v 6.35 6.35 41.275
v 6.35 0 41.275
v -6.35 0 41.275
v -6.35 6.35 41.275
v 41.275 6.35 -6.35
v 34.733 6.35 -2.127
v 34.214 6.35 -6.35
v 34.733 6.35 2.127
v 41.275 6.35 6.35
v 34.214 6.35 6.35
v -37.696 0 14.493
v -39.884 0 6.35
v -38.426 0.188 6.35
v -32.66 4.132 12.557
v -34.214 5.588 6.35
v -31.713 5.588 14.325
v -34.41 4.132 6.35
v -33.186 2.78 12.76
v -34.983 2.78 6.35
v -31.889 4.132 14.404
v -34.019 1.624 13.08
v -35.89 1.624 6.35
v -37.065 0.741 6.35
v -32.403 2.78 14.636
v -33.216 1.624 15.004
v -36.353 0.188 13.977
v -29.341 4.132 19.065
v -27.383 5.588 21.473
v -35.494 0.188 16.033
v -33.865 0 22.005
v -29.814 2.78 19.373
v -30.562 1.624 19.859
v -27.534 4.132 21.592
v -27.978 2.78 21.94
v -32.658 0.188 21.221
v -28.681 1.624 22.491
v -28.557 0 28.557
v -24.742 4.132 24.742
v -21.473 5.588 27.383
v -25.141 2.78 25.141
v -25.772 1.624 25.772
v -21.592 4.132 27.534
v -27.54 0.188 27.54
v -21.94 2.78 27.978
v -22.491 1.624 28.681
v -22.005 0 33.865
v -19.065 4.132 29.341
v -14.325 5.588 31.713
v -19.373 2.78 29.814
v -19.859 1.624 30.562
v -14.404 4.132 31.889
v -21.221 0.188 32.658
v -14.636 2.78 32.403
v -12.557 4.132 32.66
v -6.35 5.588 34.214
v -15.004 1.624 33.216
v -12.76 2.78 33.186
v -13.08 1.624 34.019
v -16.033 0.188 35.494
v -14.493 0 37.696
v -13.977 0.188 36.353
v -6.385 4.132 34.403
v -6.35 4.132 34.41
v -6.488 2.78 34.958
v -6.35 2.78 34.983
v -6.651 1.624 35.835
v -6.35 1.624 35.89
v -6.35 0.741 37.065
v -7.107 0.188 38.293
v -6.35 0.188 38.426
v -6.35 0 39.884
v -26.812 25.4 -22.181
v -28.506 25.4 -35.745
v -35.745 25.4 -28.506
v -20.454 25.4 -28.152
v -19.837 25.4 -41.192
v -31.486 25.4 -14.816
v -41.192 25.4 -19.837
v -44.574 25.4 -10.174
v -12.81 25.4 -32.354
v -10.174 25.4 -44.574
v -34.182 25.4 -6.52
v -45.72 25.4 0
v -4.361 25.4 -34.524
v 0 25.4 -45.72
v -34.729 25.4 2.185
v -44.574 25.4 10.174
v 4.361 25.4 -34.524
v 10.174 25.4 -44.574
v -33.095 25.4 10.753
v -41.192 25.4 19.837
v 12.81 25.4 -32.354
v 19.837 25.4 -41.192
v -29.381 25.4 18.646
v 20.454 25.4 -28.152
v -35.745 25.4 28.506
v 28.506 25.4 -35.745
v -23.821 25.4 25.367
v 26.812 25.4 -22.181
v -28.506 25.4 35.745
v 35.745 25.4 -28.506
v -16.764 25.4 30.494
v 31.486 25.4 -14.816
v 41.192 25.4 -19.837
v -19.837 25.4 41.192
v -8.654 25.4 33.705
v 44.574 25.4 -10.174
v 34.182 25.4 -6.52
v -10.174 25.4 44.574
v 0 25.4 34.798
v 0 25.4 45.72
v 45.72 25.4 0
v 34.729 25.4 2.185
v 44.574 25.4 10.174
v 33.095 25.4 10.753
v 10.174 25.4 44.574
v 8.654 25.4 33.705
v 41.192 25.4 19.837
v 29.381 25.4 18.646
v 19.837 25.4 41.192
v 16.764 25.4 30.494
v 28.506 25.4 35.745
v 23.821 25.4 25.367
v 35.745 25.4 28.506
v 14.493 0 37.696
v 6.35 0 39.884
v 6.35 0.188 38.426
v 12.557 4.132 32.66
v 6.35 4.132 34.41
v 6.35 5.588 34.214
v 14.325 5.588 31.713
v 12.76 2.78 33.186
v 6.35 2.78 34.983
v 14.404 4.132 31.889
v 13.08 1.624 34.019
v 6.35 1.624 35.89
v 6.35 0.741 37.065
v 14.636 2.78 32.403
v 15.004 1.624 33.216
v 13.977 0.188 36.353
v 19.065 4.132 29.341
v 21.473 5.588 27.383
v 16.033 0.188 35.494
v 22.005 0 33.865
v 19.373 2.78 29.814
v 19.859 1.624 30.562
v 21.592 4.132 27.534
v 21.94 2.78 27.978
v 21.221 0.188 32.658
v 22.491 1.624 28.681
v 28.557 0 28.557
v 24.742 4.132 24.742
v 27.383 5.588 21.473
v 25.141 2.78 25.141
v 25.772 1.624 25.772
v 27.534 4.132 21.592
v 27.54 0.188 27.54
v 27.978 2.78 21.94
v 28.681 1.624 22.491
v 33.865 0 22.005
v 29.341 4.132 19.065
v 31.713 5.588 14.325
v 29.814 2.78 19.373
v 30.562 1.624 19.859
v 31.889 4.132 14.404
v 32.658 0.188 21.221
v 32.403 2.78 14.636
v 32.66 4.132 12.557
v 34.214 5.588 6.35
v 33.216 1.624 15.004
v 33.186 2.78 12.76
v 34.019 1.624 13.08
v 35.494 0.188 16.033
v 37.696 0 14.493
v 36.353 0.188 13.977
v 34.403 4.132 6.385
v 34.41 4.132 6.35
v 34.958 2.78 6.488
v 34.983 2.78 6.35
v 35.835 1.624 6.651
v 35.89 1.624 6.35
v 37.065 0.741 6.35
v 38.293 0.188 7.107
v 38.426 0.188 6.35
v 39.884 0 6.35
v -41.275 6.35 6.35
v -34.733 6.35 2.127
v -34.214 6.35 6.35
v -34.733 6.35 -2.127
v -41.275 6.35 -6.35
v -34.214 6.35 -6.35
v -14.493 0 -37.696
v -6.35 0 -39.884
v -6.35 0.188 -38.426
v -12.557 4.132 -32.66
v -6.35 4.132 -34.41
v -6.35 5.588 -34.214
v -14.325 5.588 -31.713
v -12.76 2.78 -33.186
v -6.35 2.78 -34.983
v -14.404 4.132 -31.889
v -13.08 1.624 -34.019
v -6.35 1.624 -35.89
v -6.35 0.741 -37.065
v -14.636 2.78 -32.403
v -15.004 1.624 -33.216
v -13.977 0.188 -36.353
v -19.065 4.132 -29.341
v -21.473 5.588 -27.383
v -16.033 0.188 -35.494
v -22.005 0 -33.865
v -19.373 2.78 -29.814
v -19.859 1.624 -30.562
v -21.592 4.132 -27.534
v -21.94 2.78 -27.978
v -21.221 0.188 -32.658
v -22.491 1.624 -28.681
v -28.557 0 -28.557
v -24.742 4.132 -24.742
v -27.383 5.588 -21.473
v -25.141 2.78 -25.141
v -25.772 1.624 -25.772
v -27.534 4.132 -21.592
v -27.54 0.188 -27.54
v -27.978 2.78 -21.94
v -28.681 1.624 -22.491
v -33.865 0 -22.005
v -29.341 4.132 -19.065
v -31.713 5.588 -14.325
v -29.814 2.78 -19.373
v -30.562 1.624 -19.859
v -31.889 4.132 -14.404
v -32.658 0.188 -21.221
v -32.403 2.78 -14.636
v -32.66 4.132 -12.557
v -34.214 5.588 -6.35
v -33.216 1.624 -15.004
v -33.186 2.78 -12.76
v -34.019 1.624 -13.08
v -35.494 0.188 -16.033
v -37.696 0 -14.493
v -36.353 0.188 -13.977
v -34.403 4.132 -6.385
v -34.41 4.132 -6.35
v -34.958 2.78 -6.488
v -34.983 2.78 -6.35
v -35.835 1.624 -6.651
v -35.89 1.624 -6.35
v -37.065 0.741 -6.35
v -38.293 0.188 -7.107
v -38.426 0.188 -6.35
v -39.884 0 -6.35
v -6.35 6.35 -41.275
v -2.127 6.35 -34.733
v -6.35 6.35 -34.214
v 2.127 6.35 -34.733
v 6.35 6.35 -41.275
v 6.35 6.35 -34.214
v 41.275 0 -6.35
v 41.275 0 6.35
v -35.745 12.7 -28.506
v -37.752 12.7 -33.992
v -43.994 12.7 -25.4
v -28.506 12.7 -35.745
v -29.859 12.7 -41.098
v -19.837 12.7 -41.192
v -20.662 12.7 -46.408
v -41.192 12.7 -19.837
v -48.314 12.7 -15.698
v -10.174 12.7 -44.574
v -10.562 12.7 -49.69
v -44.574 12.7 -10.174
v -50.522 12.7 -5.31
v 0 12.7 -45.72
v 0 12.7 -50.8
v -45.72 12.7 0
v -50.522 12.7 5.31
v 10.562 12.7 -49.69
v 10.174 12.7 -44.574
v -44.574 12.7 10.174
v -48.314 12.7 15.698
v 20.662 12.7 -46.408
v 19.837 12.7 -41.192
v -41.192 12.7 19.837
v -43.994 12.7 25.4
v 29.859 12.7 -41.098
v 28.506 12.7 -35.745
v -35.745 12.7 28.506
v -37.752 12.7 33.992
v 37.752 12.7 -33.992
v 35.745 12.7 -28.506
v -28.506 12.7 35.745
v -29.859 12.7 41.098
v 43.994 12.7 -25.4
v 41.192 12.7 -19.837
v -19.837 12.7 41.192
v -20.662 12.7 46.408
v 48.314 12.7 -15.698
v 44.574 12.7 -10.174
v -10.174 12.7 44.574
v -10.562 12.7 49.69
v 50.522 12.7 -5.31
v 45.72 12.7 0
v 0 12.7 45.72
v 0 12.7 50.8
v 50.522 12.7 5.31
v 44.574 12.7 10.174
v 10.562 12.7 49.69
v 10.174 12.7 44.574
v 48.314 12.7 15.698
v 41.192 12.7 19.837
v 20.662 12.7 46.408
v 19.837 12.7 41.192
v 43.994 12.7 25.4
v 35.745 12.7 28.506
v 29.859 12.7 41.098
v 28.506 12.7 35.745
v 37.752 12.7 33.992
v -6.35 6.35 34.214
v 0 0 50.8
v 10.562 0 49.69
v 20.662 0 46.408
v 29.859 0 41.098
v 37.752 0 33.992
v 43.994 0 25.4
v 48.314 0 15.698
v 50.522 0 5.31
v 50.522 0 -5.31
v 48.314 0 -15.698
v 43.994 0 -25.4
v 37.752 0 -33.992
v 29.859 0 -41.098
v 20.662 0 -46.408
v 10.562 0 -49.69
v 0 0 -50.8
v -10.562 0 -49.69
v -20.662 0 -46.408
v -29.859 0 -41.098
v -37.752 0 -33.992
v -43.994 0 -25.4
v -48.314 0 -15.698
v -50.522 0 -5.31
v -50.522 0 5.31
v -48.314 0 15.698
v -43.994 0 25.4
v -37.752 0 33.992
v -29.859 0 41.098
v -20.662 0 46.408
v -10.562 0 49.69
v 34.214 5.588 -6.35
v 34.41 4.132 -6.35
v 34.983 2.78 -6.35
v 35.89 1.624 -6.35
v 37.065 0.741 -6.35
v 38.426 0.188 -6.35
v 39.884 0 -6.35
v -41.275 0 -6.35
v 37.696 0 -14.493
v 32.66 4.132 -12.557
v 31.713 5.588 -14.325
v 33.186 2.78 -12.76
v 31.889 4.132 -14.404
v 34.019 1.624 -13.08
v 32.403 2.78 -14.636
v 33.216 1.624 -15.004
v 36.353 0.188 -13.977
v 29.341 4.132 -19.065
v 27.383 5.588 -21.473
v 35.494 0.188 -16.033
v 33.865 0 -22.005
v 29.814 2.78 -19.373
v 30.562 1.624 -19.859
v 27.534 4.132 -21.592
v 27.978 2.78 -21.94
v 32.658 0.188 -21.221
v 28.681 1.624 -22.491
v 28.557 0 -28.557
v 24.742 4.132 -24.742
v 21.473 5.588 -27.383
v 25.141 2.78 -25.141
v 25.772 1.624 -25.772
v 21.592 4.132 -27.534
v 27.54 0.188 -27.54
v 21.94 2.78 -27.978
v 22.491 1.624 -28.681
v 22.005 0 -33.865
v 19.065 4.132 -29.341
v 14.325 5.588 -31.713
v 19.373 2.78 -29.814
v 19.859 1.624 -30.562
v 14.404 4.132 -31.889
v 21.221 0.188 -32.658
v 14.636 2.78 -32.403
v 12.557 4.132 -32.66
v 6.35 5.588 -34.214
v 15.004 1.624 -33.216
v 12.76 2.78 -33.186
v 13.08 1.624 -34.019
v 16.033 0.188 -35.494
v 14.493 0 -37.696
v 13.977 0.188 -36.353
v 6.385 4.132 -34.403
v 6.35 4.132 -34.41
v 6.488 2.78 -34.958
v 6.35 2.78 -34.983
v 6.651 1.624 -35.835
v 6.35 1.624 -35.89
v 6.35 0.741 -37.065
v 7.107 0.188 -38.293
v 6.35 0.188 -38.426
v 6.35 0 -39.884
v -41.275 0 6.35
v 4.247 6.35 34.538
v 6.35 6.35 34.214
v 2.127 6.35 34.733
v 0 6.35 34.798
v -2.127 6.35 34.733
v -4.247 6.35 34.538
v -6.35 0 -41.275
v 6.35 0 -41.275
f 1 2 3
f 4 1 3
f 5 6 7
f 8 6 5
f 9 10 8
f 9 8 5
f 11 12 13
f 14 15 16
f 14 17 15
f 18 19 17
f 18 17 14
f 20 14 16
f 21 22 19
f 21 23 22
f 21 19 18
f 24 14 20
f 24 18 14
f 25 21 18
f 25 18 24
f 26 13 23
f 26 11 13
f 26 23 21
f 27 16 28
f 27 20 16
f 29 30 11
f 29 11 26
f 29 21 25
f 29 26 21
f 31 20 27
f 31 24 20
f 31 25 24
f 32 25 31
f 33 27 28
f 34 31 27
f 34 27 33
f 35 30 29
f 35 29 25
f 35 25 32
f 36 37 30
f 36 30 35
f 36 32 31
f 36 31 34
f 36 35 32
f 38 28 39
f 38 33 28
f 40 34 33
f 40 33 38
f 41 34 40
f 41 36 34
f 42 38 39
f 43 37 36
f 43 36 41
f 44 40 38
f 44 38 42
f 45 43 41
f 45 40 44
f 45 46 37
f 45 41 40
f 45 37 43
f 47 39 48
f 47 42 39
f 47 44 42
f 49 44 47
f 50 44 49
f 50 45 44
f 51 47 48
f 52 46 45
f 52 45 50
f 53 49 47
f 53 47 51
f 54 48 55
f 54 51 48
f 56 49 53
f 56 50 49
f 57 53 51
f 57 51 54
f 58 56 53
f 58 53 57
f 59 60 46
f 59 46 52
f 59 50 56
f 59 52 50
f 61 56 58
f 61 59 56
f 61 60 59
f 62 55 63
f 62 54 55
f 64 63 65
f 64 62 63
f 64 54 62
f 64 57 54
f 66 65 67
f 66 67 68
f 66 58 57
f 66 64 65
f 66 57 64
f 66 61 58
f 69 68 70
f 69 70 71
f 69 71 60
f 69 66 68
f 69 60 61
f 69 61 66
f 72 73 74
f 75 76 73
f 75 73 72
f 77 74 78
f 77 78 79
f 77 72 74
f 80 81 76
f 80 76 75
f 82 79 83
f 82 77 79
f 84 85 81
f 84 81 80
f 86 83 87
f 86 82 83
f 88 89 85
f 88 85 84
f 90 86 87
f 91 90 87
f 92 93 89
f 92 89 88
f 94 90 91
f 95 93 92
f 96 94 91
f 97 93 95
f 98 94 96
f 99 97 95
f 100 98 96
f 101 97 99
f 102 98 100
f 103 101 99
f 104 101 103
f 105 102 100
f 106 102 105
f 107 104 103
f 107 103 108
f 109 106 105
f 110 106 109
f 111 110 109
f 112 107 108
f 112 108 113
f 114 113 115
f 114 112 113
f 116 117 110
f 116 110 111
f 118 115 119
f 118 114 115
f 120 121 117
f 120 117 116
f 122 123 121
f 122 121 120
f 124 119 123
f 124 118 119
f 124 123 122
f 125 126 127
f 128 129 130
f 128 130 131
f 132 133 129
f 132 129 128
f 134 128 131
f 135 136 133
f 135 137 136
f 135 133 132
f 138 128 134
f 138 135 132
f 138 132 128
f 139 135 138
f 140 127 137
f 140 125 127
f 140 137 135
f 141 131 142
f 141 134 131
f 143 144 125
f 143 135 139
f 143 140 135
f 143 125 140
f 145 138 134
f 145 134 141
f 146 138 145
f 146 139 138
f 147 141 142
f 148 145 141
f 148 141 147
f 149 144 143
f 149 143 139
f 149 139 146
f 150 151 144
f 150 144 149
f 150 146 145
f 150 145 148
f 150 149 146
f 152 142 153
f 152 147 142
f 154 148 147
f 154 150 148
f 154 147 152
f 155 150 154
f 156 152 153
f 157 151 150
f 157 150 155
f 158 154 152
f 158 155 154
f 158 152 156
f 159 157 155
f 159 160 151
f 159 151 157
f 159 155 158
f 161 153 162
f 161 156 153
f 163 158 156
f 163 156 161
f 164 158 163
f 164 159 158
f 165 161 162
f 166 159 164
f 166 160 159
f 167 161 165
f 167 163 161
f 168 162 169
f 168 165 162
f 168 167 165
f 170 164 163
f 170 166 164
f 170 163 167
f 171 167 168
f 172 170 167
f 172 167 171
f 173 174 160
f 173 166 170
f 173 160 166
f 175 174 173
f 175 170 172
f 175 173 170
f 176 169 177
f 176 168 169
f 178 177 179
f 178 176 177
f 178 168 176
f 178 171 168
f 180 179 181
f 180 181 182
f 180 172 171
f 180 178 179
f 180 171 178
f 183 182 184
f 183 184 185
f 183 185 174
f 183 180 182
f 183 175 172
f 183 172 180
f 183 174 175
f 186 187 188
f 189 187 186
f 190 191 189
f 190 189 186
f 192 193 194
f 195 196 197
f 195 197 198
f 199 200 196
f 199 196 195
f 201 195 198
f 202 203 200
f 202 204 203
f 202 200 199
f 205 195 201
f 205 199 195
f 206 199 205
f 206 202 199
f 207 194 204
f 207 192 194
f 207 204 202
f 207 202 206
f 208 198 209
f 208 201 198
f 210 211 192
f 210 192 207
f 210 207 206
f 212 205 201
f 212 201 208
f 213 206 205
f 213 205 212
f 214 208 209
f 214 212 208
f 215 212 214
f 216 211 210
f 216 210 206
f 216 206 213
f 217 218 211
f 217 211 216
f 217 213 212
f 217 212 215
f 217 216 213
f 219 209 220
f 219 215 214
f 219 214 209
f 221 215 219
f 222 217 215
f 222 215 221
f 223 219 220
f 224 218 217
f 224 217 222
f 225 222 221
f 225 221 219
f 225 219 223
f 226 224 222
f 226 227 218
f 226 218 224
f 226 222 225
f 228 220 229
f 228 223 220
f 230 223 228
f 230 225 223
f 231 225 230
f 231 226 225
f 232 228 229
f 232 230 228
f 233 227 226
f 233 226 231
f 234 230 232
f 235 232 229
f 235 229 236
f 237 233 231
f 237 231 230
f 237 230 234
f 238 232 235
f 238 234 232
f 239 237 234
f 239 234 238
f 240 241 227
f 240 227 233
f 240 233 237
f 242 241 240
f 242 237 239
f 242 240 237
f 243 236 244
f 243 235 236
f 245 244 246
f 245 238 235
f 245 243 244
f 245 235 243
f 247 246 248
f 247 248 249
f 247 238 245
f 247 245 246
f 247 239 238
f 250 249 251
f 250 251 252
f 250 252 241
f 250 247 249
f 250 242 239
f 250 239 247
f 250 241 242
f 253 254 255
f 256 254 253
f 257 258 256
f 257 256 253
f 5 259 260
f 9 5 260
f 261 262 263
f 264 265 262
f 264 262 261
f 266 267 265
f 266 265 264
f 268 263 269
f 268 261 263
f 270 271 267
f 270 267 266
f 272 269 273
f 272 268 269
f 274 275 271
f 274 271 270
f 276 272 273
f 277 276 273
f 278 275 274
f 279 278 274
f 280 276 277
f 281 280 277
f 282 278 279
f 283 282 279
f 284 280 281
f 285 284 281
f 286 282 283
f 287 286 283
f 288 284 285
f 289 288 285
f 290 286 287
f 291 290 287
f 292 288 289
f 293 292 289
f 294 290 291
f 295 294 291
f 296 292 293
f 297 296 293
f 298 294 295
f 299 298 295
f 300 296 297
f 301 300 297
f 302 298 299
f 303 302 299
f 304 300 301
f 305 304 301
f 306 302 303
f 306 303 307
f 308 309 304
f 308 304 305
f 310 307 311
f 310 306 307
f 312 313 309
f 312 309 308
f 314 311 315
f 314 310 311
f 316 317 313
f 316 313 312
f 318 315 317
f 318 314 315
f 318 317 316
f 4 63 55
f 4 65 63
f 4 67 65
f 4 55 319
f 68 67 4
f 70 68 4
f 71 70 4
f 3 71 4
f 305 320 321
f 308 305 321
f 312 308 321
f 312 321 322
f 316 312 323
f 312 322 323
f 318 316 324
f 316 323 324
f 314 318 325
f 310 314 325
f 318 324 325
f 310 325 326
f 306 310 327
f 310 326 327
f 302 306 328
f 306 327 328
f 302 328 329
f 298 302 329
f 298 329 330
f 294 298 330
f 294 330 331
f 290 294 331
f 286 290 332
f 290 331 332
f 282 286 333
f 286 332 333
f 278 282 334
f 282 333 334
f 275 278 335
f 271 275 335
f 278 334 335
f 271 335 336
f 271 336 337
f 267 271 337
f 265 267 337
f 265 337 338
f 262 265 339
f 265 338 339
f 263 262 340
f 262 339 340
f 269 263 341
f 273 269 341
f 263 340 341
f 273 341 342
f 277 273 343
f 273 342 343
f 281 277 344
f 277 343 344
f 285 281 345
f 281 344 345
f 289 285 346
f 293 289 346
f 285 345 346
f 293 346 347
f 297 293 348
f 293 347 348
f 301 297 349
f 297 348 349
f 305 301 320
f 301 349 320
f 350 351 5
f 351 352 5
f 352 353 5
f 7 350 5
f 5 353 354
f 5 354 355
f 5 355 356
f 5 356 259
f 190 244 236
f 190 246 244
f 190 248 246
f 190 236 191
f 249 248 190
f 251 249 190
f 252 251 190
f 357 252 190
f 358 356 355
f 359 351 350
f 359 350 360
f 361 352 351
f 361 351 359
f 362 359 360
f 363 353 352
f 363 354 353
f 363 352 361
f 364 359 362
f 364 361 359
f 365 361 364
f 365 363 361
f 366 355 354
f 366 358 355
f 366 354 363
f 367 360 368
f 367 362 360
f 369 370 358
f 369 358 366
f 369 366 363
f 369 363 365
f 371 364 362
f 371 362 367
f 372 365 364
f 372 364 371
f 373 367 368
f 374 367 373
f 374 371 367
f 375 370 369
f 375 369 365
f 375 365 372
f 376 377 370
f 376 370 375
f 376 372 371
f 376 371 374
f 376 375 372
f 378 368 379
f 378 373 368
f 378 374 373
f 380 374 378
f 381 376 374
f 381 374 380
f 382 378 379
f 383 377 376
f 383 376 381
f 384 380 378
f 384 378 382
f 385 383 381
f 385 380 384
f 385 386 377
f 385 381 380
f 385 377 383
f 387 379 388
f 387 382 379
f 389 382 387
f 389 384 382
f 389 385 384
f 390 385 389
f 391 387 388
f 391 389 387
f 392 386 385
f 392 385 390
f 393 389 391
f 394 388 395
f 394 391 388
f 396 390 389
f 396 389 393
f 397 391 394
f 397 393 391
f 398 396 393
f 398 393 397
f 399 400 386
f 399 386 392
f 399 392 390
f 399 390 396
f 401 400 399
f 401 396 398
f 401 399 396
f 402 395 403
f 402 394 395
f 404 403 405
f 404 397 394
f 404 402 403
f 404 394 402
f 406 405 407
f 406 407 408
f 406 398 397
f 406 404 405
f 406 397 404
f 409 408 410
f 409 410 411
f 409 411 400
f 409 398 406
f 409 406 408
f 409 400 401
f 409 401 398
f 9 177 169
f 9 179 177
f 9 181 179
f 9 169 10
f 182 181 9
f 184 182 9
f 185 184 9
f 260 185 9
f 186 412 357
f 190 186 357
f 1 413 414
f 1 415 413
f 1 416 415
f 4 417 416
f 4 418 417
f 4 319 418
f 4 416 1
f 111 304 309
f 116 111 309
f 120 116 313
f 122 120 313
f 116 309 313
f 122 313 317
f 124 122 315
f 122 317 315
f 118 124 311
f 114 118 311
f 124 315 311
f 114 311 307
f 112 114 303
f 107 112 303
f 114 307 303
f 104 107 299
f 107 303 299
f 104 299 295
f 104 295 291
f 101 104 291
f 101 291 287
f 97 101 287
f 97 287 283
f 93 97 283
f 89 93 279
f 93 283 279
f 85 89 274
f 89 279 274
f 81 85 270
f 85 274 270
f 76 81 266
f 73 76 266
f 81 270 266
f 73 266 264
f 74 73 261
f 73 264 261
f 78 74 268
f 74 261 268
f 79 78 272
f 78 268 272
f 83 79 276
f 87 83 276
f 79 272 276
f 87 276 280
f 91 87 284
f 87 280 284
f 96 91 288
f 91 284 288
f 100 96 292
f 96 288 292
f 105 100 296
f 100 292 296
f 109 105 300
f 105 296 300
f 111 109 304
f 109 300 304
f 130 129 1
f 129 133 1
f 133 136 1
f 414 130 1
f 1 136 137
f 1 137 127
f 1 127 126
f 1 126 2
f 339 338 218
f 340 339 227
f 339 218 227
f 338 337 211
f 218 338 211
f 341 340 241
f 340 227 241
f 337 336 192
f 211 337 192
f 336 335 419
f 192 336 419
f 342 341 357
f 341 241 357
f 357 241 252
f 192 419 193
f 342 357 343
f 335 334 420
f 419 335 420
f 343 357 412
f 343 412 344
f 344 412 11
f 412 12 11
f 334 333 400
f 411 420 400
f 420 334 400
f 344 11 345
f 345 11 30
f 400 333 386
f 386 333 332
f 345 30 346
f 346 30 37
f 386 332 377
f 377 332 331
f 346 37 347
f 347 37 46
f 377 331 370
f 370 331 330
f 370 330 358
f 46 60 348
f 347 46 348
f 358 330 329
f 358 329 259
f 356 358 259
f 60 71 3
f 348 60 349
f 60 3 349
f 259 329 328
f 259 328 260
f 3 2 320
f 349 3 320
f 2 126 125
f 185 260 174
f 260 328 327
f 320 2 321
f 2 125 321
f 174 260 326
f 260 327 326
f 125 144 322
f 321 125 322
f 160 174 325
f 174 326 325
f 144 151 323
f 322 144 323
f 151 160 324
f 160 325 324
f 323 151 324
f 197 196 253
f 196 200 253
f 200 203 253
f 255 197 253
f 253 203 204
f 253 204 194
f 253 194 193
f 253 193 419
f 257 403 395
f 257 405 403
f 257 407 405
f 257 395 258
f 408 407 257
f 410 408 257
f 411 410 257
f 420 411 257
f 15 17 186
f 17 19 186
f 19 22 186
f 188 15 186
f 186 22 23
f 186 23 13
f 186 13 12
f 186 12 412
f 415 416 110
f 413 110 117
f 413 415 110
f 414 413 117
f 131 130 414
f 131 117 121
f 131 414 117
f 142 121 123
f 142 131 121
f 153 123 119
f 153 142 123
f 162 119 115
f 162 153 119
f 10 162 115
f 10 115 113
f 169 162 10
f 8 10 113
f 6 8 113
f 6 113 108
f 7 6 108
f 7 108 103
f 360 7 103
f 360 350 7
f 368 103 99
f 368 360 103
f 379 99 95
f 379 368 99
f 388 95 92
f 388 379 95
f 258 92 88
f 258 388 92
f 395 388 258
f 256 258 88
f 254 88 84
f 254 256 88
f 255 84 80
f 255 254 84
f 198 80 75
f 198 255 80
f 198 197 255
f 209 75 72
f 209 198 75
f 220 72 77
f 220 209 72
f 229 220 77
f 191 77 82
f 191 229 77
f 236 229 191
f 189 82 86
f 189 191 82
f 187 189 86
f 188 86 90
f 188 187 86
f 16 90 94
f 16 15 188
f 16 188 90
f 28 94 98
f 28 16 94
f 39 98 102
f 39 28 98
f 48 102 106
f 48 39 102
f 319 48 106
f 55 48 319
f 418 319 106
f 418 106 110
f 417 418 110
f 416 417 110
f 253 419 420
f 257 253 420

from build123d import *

# Parameters (mm, degrees)
SKETCH1_R           = 50.8
SKETCH1_R_2         = 34.798
BOSS_EXTRUDE1_DEPTH = 12.7
SKETCH2_R           = 45.72
SKETCH2_R_2         = 34.798
BOSS_EXTRUDE2_DEPTH = 12.7
FILLET1_R           = 5.588
SKETCH3_W           = 12.7
SKETCH3_H           = 12.7
CUT_EXTRUDE1_DEPTH  = 6.35
CIRPATTERN1_COUNT   = 4


with BuildPart() as part:
    # Sketch1 → Boss-Extrude1 (new body)
    with BuildSketch(Plane(origin=(0, 0, 0), x_dir=(1, 0, 0), z_dir=(0, 1, 0))):
        with Locations(Location((0, 0, 0), (0, 0, 270))):
            Circle(SKETCH1_R)
        with Locations(Location((0, 0, 0), (0, 0, 270))):
            Circle(SKETCH1_R_2, mode=Mode.SUBTRACT)
    extrude(amount=BOSS_EXTRUDE1_DEPTH)

    # Sketch2 → Boss-Extrude2 (add)
    with BuildSketch(Plane(origin=(0, 12.7, 0), x_dir=(1, 0, 0), z_dir=(0, 1, 0))):
        with Locations(Location((0, 0, 0), (0, 0, 270))):
            Circle(SKETCH2_R)
        with Locations(Location((0, 0, 0), (0, 0, 270))):
            Circle(SKETCH2_R_2, mode=Mode.SUBTRACT)
    extrude(amount=BOSS_EXTRUDE2_DEPTH)

    # Fillet1
    fillet1_edges = [part.edges().sort_by_distance(p)[0] for p in [
        (0, 0, -34.798),
    ]]
    fillet(fillet1_edges, radius=FILLET1_R)

    # Sketch3 → Cut-Extrude1 (cut)
    with BuildSketch(Plane.XZ):
        with Locations((34.925, 0)):
            Rectangle(SKETCH3_W, SKETCH3_H)
    cut_extrude1 = extrude(amount=-CUT_EXTRUDE1_DEPTH, mode=Mode.SUBTRACT)

    # CirPattern1: Cut-Extrude1 ×4 about axis
    cirpattern1_axis = Axis((0, 0, 0), (0, 1, 0))
    for i in range(1, CIRPATTERN1_COUNT):
        add(cut_extrude1.rotate(cirpattern1_axis, i * 360 / CIRPATTERN1_COUNT), mode=Mode.SUBTRACT)


solid = part.part
